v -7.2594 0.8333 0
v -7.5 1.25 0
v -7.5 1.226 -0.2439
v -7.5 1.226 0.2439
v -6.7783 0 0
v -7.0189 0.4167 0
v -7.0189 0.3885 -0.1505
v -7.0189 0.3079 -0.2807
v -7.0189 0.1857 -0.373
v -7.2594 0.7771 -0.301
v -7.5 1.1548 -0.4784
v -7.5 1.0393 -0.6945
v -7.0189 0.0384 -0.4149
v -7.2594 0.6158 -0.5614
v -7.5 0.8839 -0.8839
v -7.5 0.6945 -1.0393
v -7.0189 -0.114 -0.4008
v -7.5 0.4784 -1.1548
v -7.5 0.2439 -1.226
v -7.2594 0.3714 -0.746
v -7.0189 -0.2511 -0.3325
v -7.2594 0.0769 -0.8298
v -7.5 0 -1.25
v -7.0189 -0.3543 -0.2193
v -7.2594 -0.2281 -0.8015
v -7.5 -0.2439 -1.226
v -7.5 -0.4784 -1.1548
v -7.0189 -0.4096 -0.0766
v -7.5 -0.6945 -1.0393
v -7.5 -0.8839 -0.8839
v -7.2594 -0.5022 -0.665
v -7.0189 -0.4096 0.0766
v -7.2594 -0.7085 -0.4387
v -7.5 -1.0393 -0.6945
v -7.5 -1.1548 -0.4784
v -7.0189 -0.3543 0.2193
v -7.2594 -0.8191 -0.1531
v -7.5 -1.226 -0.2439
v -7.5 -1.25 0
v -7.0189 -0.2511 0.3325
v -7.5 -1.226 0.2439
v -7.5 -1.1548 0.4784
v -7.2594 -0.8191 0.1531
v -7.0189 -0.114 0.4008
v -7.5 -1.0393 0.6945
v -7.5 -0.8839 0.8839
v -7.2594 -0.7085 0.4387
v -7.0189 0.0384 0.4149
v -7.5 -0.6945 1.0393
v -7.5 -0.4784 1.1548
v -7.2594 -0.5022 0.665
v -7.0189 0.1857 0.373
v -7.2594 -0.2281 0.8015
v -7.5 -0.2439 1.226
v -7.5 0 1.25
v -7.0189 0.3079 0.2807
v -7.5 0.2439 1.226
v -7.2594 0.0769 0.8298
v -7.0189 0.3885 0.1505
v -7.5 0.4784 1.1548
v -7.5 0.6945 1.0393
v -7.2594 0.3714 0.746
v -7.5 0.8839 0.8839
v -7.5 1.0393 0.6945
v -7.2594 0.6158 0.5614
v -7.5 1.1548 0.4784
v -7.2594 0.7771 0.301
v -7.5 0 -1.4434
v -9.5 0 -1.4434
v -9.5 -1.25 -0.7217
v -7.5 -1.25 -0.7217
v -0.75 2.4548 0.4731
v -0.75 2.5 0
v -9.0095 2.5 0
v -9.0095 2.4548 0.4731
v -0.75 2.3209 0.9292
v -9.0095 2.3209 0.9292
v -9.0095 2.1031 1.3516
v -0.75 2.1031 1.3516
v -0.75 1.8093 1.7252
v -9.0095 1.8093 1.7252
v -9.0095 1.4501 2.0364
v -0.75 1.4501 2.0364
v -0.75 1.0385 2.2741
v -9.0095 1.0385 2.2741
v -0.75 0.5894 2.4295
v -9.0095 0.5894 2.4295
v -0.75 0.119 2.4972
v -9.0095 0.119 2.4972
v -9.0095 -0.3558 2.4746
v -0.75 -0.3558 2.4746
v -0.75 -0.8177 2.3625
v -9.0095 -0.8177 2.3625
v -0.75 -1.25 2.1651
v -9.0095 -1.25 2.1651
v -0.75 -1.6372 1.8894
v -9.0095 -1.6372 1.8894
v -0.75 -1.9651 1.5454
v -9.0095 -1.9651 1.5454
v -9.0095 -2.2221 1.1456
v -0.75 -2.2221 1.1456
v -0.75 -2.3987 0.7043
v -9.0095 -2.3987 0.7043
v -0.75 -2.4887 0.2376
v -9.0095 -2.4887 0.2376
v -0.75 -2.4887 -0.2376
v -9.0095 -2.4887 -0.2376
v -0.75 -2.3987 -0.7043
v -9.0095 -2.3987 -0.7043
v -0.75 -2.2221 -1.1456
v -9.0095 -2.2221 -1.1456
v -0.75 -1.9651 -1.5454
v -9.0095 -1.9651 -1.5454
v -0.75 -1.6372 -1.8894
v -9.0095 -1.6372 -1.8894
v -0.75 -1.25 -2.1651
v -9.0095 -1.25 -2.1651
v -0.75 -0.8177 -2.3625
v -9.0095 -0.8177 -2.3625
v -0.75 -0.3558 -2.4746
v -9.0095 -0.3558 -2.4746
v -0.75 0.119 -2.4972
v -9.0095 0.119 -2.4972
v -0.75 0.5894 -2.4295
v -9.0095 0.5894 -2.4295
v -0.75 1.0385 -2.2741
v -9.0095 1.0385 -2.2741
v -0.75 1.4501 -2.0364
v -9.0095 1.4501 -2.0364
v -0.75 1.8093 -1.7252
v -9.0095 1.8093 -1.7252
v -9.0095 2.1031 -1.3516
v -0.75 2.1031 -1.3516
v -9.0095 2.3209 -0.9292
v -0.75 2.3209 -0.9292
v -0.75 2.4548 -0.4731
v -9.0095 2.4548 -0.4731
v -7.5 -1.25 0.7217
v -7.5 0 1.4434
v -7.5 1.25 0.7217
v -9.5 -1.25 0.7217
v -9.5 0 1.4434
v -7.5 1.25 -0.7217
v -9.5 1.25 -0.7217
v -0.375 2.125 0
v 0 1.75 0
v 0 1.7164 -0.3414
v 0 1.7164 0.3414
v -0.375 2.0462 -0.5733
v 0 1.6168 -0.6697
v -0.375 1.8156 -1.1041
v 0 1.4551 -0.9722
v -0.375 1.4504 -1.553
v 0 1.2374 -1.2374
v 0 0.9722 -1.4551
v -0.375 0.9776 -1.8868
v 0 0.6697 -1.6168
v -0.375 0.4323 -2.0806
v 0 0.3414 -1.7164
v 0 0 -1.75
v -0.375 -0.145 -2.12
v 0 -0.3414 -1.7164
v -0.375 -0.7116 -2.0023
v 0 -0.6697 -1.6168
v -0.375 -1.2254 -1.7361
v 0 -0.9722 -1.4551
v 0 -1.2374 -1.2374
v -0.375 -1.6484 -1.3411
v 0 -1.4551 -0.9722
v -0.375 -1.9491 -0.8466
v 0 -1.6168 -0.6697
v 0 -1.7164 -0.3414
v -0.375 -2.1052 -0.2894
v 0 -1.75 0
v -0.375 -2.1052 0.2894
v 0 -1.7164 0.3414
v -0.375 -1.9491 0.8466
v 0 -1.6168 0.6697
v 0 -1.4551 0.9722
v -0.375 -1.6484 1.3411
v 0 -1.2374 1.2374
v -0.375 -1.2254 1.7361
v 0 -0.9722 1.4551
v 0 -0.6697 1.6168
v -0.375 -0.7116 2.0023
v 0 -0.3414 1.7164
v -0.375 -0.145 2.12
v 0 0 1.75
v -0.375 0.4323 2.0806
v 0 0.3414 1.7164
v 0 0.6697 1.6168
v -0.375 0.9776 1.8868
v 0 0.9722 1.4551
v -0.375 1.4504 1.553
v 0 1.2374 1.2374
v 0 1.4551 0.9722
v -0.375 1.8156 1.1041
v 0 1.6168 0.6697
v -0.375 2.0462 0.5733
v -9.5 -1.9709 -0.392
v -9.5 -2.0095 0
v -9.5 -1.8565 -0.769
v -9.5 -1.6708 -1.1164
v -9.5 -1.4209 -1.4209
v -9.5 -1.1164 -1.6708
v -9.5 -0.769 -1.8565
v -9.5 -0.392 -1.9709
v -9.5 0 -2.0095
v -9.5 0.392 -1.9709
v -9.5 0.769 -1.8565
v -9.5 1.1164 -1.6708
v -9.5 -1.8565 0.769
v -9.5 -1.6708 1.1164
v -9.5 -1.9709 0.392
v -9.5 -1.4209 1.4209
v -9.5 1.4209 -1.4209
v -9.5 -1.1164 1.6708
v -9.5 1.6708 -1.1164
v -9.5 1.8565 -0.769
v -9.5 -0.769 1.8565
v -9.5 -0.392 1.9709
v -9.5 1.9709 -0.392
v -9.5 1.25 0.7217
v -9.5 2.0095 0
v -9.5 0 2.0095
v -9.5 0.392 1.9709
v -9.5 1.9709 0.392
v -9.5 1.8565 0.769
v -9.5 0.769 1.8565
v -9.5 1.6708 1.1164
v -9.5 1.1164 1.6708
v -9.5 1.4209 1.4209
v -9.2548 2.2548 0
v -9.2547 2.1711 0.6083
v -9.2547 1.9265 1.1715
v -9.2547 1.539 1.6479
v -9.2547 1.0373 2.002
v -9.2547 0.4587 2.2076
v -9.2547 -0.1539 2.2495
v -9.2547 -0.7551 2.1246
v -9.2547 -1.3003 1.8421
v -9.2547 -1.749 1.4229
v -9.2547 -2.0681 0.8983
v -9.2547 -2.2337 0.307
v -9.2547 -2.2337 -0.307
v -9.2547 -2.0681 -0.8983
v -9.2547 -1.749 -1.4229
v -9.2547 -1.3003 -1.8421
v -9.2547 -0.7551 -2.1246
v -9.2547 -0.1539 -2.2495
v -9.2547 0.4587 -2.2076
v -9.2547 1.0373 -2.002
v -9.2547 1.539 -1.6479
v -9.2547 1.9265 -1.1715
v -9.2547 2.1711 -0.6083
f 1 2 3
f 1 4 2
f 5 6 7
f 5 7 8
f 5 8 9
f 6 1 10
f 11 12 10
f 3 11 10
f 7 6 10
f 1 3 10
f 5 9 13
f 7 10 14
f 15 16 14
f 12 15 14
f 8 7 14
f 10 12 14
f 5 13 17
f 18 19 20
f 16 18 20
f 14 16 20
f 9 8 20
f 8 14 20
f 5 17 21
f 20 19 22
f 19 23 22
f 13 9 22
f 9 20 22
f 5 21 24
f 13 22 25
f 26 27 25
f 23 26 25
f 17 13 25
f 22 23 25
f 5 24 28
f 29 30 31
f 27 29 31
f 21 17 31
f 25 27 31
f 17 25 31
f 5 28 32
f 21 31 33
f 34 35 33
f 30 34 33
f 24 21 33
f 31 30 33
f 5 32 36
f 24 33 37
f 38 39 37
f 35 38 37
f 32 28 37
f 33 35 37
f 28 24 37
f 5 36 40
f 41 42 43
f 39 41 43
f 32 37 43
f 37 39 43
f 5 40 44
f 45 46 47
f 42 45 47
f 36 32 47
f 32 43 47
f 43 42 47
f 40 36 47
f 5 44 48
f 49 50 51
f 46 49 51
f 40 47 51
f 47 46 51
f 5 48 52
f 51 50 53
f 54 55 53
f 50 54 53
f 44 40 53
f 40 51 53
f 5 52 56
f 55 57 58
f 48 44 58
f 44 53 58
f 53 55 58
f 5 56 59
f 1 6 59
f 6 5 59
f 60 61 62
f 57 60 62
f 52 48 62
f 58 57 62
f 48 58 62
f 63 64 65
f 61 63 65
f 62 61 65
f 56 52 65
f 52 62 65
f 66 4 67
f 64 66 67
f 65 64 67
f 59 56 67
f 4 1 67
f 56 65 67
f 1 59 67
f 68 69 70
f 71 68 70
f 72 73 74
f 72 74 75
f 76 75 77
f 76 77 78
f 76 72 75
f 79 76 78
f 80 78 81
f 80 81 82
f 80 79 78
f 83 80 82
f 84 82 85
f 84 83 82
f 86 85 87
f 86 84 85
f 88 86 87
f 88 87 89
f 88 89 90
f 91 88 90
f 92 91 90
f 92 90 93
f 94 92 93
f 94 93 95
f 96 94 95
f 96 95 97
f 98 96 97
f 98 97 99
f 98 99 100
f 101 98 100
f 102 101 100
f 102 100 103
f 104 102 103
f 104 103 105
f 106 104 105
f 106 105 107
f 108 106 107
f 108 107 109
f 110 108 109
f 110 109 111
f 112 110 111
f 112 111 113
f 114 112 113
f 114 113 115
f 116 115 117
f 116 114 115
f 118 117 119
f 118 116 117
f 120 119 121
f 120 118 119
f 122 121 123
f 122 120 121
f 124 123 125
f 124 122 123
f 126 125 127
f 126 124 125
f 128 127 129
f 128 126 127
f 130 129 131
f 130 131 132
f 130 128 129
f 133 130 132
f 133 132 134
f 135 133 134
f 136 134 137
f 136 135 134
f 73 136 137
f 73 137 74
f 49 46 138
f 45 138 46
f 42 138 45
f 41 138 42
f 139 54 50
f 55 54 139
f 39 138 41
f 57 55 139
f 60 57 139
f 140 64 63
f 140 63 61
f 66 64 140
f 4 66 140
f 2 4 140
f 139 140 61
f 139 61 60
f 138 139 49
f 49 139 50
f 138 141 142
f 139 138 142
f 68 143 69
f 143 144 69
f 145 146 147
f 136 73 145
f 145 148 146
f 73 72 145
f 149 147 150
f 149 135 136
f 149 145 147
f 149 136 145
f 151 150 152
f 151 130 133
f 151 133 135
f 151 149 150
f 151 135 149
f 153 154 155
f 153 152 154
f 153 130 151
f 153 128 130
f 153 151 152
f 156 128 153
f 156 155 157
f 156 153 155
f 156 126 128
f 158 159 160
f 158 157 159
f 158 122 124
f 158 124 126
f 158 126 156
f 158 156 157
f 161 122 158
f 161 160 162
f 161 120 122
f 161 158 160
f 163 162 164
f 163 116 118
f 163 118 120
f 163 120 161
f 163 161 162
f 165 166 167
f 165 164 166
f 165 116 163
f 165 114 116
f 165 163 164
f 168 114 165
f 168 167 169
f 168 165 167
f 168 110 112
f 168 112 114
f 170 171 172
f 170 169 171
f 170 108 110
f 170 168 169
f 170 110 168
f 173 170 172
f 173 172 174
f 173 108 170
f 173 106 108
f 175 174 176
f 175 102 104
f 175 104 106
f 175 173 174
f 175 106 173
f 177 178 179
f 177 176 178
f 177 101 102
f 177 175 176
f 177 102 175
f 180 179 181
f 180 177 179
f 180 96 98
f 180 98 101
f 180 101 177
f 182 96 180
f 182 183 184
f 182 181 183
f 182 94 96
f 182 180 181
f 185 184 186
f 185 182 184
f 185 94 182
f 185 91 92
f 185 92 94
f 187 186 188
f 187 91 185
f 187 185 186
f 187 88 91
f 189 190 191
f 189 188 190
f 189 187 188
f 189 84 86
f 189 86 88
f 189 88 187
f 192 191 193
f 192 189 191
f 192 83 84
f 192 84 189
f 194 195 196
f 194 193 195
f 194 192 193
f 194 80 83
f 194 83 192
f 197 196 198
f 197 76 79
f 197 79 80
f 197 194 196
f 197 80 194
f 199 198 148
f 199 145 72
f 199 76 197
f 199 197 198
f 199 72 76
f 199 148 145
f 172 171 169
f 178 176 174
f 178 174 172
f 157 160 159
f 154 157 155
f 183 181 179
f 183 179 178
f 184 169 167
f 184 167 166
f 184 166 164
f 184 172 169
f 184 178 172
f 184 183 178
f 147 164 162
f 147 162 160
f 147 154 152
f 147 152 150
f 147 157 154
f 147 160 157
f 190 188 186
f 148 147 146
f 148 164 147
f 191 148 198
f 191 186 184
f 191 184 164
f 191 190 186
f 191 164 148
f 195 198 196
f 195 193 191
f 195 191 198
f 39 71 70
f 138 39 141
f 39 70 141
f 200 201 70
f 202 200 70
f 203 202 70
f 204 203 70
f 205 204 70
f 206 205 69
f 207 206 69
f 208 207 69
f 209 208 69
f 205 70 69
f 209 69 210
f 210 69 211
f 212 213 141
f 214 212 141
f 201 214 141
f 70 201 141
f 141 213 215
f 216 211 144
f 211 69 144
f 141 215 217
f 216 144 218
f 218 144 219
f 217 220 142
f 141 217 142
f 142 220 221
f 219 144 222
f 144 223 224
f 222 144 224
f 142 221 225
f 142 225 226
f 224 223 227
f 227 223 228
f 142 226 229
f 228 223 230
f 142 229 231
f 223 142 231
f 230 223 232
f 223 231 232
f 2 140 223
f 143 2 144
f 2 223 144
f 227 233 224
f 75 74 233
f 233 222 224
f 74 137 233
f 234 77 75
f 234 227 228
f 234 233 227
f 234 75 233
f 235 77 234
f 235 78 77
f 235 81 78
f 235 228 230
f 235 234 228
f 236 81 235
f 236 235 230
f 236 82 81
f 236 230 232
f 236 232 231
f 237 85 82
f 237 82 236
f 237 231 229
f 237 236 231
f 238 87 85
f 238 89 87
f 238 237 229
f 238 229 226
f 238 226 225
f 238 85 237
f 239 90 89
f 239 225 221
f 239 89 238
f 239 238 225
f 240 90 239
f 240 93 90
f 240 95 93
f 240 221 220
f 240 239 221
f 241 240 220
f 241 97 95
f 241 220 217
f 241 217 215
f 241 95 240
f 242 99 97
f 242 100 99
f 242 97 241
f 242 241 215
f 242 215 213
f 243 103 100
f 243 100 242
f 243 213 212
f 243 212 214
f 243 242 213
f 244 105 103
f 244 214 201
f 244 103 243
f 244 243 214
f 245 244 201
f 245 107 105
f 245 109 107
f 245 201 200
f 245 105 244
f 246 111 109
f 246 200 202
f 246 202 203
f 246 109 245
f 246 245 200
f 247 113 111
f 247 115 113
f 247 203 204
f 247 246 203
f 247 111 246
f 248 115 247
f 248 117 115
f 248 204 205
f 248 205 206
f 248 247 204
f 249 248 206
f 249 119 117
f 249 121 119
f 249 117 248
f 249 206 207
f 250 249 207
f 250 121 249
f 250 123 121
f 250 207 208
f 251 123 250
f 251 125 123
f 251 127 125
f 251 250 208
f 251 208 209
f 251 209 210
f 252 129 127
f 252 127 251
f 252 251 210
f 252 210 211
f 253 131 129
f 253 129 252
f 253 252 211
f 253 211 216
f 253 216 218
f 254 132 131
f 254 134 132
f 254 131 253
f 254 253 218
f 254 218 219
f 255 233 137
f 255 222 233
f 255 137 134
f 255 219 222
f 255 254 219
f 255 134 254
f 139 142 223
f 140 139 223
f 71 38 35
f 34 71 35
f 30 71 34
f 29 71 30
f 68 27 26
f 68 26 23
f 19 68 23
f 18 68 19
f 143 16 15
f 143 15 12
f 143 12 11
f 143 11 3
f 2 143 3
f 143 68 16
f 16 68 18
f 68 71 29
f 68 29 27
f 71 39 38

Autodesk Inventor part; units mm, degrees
sketch "Sketch_1" plane through (0, 0, 0) normal (0, 0, 1) x (1, 0, 0)
  line L0 (0, 0) -> (-9.5, 0)
  line L1 (-9.5, 0) -> (-9.5, 2.0095)
  line L2 (-9.5, 2.0095) -> (-9.0095, 2.5)
  line L3 (-9.0095, 2.5) -> (-0.75, 2.5)
  line L4 (-0.75, 2.5) -> (0, 1.75)
  line L5 (0, 1.75) -> (0, 0)
  line L6 (0, 0) -> (-9.5, 0)
revolve "Revolution1" add sketch "Sketch_1" angle 360 about axis through (0, 0, 0) along (1, 0, 0)
thread "Thread1" size "M5x0.8" class "6g" standard "ISO Metric profile" full length
sketch "Sketch_2" plane through (-9.5, 0, 0) normal (-1, 0, 0) x (0, 1, 0)
  line L0 (-1.25, 0.7217) -> (-1.25, -0.7217)
  line L1 (-1.25, -0.7217) -> (0, -1.4434)
  line L2 (0, -1.4434) -> (1.25, -0.7217)
  line L3 (1.25, -0.7217) -> (1.25, 0.7217)
  line L4 (1.25, 0.7217) -> (0, 1.4434)
  line L5 (0, 1.4434) -> (-1.25, 0.7217)
extrude "Extrusion1" cut sketch "Sketch_2" against normal blind 2
sketch "Sketch_3" plane through (0, 0, 0) normal (0, 0, 1) x (1, 0, 0)
  line L0 (-6.7783, 0) -> (-7.5, 0)
  line L1 (-7.5, 0) -> (-7.5, 1.25)
  line L2 (-7.5, 1.25) -> (-6.7783, 0)
  line L3 (-6.7783, 0) -> (-7.5, 0)
revolve "Revolution2" cut sketch "Sketch_3" angle 360 about axis through (-6.7783, 0, 0) along (1, 0, 0)
ref_plane "CP_XY" through (0, 0, 0) normal (1, 0, 0) x (0, 0, -1)
ref_plane "CP_YZ" through (0, 0, 0) normal (0, 0, -1) x (0, 1, 0)
ref_plane "CP_ZX" through (0, 0, 0) normal (0, 1, 0) x (1, 0, 0)
properties part number "SET-SCREW5-9.5"
